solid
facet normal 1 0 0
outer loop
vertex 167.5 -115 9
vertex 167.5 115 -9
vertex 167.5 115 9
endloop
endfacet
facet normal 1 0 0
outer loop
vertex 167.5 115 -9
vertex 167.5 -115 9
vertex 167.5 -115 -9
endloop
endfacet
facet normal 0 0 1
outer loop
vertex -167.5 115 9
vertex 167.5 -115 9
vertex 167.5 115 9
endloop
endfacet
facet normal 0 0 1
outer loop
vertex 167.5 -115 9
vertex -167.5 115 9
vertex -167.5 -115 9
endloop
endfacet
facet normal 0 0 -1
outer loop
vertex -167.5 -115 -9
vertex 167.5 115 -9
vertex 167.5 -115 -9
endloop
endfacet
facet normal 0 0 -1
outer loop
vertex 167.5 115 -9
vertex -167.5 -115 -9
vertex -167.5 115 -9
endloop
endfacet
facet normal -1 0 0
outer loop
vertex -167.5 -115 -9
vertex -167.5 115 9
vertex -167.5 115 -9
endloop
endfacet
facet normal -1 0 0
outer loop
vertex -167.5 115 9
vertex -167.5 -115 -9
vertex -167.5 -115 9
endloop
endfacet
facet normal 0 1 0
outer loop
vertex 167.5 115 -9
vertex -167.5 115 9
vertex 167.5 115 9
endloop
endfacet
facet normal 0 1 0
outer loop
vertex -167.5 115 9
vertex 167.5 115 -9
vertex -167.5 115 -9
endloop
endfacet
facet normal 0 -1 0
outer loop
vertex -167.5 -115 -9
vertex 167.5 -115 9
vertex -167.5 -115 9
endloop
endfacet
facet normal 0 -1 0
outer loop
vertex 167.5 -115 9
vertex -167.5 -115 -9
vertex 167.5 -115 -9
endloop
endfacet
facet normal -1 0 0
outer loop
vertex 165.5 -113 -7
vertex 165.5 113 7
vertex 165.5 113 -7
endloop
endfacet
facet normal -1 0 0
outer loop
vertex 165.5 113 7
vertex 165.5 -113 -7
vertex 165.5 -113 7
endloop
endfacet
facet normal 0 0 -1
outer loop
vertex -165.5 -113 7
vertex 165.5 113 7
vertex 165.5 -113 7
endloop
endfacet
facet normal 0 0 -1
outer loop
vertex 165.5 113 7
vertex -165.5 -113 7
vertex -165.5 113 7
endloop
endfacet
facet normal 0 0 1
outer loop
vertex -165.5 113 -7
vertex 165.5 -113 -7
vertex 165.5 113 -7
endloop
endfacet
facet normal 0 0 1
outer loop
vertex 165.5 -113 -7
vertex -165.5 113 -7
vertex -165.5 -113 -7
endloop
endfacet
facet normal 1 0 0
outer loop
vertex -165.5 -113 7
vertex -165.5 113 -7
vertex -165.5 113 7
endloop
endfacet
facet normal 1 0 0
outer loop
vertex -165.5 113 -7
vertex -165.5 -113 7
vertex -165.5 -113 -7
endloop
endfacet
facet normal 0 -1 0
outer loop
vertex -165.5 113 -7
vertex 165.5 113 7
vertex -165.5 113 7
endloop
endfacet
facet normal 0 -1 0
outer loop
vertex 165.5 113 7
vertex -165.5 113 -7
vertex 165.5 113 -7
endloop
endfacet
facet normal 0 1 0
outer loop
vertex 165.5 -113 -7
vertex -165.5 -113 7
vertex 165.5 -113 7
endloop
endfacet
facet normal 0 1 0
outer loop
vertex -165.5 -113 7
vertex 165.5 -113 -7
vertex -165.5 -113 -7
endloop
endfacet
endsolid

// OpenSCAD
// REPRESENTATIVE_ENCLOSURE — parameterized concept model
// Device: Student 14.5 (student_14_5)
// Status: REPRESENTATIVE_ENCLOSURE_PHYSICAL_PENDING
// Evidence class: MODELED (not MEASURED)

device_id = "student_14_5";
outer_w = 335;
outer_d = 230;
outer_h = 18;
wall = 2.0;
corner_r = 4.0;
tolerance = 0.3;

module outer_shell() {
  difference() {
    cube([outer_w, outer_d, outer_h], center=true);
    cube([outer_w-2*wall, outer_d-2*wall, outer_h-2*wall], center=true);
  }
}

module interference_keepout() {
  // Battery / PCB keepouts for digital interference check
  translate([0, 0, -outer_h/4]) cube([outer_w*0.6, outer_d*0.5, outer_h*0.35], center=true);
}

outer_shell();
%interference_keepout();
